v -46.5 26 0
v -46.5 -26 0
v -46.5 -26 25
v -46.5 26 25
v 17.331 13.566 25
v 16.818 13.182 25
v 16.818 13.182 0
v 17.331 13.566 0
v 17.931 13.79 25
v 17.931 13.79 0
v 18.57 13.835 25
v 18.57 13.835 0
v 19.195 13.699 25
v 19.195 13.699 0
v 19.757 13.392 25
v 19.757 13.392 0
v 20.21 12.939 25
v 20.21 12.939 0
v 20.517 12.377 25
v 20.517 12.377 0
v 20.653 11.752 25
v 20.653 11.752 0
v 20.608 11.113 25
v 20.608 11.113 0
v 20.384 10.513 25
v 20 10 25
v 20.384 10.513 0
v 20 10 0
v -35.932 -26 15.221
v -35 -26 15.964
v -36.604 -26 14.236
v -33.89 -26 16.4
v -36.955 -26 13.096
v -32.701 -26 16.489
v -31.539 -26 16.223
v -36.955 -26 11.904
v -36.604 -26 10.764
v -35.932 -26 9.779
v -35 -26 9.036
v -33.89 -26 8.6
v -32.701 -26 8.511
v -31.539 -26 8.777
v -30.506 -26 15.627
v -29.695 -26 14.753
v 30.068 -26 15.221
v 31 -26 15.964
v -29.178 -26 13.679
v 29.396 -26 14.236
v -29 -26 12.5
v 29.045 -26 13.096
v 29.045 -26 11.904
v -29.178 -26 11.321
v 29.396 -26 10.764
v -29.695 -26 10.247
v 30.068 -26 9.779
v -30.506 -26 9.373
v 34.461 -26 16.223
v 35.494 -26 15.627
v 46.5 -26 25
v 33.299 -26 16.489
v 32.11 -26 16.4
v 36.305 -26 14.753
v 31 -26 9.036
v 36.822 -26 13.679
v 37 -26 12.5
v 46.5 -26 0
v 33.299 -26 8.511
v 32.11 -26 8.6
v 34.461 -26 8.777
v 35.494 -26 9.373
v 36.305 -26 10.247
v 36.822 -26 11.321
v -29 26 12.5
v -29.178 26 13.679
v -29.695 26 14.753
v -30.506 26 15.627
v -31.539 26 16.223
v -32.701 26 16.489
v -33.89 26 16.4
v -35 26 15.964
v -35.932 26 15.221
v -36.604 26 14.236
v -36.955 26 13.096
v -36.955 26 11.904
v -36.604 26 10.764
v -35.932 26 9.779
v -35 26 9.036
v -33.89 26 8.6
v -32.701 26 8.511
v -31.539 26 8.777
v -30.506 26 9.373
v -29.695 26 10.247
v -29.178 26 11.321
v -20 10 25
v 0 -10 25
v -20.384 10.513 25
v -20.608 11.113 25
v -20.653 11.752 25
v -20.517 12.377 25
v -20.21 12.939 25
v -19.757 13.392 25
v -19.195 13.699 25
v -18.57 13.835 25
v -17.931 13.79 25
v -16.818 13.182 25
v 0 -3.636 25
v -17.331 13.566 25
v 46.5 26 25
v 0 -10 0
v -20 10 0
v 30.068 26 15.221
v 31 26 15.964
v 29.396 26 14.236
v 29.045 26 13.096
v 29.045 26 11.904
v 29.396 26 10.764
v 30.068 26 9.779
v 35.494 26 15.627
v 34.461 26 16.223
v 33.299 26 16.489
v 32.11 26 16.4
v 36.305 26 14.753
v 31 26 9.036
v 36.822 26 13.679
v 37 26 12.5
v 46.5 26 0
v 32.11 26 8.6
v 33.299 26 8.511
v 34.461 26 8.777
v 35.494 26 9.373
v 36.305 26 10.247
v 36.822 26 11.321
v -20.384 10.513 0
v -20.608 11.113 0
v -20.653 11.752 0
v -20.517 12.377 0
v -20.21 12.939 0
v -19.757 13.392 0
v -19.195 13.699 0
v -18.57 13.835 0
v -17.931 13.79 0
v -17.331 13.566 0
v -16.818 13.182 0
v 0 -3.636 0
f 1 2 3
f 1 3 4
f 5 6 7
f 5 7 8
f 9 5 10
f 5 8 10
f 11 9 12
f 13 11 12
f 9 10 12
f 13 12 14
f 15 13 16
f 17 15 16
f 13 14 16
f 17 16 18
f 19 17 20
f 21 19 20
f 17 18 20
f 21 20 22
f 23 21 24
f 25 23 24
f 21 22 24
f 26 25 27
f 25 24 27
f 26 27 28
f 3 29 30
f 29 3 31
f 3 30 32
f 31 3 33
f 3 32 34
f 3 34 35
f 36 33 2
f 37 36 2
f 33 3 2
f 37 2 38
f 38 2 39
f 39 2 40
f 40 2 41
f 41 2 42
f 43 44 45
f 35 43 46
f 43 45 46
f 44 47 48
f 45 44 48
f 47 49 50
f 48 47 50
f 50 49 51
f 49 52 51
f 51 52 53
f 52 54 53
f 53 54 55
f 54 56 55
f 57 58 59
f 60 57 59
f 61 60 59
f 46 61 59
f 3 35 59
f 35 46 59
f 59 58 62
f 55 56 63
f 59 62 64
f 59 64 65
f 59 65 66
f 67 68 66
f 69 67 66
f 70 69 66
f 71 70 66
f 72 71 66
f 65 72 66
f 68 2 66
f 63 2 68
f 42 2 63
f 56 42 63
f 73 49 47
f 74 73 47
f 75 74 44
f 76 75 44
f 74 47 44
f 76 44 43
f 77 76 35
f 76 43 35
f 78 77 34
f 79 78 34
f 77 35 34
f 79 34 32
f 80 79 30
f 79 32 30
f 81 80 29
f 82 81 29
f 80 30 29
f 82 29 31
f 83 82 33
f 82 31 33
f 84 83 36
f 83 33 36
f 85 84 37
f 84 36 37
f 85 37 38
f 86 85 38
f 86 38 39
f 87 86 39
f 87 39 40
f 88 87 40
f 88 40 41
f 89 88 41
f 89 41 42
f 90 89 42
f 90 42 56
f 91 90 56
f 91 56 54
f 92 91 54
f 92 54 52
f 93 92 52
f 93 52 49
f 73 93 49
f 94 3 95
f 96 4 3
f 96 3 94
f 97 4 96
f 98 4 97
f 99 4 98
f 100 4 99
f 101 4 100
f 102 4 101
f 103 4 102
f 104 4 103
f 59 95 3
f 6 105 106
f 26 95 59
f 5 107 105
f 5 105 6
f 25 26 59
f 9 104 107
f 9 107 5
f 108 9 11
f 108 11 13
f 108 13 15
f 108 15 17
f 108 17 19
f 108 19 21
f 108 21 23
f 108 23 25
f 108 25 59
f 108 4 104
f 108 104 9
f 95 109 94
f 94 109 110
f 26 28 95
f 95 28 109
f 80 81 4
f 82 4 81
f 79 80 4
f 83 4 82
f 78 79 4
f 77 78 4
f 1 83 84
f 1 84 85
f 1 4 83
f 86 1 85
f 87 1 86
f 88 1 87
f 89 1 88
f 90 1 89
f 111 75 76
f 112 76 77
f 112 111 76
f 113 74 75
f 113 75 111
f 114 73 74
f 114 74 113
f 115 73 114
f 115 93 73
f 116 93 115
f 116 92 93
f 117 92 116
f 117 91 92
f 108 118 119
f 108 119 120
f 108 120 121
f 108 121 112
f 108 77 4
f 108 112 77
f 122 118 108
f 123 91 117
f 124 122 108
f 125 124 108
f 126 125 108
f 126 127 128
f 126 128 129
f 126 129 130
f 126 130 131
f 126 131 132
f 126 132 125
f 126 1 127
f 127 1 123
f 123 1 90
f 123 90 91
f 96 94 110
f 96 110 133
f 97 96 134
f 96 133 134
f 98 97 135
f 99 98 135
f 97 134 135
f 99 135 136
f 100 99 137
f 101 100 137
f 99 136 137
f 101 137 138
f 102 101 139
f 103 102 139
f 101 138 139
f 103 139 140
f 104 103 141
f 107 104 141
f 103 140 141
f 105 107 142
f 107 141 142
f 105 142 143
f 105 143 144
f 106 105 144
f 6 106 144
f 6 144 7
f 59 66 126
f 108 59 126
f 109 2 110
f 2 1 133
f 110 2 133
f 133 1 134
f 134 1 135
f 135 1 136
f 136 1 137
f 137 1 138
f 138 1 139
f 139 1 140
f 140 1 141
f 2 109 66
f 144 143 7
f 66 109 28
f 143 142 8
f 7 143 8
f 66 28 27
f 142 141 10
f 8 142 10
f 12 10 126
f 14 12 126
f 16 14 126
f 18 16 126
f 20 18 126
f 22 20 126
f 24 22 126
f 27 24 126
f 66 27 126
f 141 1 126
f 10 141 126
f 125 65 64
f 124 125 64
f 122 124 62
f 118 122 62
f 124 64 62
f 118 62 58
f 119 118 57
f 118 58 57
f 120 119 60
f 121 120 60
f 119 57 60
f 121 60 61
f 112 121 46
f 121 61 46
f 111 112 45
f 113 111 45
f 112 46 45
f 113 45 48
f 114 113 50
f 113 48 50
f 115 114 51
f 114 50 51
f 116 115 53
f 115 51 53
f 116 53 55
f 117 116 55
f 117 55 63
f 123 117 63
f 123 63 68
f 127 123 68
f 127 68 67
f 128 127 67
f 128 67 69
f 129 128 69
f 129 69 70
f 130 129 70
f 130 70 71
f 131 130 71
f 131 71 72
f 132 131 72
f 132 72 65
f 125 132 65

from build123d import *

# Parameters (mm, degrees)
SKETCH1_W           = 93
SKETCH1_H           = 52
BOSS_EXTRUDE1_DEPTH = 25
CUT_EXTRUDE1_DEPTH  = 26
SKETCH3_R           = 4
CUT_EXTRUDE2_DEPTH  = 53


with BuildPart() as part:
    # Sketch1 → Boss-Extrude1 (new body)
    with BuildSketch(Plane.XY):
        Rectangle(SKETCH1_W, SKETCH1_H)
    extrude(amount=BOSS_EXTRUDE1_DEPTH)

    # Sketch2 → Cut-Extrude1 (cut, through all)
    with BuildSketch(Plane(origin=(0, 0, 0), x_dir=(-1, 0, 0), z_dir=(0, 0, -1))):
        with BuildLine():
            Line((0, -10), (20, 10))
            ThreePointArc((20, 10), (20, 13.181980515), (16.818019485, 13.181980515))
            Line((16.818019485, 13.181980515), (0, -3.636038969))
            Line((0, -3.636038969), (-16.818019485, 13.181980515))
            ThreePointArc((-16.818019485, 13.181980515), (-20, 13.181980515), (-20, 10))
            Line((-20, 10), (0, -10))
        make_face()
    extrude(amount=-CUT_EXTRUDE1_DEPTH, mode=Mode.SUBTRACT)

    # Sketch3 → Cut-Extrude2 (cut, through all)
    with BuildSketch(Plane.XZ.offset(26)):
        with Locations((-33, 12.5)):
            Circle(SKETCH3_R)
        with Locations((33, 12.5)):
            Circle(SKETCH3_R)
    extrude(amount=-CUT_EXTRUDE2_DEPTH, mode=Mode.SUBTRACT)


solid = part.part
